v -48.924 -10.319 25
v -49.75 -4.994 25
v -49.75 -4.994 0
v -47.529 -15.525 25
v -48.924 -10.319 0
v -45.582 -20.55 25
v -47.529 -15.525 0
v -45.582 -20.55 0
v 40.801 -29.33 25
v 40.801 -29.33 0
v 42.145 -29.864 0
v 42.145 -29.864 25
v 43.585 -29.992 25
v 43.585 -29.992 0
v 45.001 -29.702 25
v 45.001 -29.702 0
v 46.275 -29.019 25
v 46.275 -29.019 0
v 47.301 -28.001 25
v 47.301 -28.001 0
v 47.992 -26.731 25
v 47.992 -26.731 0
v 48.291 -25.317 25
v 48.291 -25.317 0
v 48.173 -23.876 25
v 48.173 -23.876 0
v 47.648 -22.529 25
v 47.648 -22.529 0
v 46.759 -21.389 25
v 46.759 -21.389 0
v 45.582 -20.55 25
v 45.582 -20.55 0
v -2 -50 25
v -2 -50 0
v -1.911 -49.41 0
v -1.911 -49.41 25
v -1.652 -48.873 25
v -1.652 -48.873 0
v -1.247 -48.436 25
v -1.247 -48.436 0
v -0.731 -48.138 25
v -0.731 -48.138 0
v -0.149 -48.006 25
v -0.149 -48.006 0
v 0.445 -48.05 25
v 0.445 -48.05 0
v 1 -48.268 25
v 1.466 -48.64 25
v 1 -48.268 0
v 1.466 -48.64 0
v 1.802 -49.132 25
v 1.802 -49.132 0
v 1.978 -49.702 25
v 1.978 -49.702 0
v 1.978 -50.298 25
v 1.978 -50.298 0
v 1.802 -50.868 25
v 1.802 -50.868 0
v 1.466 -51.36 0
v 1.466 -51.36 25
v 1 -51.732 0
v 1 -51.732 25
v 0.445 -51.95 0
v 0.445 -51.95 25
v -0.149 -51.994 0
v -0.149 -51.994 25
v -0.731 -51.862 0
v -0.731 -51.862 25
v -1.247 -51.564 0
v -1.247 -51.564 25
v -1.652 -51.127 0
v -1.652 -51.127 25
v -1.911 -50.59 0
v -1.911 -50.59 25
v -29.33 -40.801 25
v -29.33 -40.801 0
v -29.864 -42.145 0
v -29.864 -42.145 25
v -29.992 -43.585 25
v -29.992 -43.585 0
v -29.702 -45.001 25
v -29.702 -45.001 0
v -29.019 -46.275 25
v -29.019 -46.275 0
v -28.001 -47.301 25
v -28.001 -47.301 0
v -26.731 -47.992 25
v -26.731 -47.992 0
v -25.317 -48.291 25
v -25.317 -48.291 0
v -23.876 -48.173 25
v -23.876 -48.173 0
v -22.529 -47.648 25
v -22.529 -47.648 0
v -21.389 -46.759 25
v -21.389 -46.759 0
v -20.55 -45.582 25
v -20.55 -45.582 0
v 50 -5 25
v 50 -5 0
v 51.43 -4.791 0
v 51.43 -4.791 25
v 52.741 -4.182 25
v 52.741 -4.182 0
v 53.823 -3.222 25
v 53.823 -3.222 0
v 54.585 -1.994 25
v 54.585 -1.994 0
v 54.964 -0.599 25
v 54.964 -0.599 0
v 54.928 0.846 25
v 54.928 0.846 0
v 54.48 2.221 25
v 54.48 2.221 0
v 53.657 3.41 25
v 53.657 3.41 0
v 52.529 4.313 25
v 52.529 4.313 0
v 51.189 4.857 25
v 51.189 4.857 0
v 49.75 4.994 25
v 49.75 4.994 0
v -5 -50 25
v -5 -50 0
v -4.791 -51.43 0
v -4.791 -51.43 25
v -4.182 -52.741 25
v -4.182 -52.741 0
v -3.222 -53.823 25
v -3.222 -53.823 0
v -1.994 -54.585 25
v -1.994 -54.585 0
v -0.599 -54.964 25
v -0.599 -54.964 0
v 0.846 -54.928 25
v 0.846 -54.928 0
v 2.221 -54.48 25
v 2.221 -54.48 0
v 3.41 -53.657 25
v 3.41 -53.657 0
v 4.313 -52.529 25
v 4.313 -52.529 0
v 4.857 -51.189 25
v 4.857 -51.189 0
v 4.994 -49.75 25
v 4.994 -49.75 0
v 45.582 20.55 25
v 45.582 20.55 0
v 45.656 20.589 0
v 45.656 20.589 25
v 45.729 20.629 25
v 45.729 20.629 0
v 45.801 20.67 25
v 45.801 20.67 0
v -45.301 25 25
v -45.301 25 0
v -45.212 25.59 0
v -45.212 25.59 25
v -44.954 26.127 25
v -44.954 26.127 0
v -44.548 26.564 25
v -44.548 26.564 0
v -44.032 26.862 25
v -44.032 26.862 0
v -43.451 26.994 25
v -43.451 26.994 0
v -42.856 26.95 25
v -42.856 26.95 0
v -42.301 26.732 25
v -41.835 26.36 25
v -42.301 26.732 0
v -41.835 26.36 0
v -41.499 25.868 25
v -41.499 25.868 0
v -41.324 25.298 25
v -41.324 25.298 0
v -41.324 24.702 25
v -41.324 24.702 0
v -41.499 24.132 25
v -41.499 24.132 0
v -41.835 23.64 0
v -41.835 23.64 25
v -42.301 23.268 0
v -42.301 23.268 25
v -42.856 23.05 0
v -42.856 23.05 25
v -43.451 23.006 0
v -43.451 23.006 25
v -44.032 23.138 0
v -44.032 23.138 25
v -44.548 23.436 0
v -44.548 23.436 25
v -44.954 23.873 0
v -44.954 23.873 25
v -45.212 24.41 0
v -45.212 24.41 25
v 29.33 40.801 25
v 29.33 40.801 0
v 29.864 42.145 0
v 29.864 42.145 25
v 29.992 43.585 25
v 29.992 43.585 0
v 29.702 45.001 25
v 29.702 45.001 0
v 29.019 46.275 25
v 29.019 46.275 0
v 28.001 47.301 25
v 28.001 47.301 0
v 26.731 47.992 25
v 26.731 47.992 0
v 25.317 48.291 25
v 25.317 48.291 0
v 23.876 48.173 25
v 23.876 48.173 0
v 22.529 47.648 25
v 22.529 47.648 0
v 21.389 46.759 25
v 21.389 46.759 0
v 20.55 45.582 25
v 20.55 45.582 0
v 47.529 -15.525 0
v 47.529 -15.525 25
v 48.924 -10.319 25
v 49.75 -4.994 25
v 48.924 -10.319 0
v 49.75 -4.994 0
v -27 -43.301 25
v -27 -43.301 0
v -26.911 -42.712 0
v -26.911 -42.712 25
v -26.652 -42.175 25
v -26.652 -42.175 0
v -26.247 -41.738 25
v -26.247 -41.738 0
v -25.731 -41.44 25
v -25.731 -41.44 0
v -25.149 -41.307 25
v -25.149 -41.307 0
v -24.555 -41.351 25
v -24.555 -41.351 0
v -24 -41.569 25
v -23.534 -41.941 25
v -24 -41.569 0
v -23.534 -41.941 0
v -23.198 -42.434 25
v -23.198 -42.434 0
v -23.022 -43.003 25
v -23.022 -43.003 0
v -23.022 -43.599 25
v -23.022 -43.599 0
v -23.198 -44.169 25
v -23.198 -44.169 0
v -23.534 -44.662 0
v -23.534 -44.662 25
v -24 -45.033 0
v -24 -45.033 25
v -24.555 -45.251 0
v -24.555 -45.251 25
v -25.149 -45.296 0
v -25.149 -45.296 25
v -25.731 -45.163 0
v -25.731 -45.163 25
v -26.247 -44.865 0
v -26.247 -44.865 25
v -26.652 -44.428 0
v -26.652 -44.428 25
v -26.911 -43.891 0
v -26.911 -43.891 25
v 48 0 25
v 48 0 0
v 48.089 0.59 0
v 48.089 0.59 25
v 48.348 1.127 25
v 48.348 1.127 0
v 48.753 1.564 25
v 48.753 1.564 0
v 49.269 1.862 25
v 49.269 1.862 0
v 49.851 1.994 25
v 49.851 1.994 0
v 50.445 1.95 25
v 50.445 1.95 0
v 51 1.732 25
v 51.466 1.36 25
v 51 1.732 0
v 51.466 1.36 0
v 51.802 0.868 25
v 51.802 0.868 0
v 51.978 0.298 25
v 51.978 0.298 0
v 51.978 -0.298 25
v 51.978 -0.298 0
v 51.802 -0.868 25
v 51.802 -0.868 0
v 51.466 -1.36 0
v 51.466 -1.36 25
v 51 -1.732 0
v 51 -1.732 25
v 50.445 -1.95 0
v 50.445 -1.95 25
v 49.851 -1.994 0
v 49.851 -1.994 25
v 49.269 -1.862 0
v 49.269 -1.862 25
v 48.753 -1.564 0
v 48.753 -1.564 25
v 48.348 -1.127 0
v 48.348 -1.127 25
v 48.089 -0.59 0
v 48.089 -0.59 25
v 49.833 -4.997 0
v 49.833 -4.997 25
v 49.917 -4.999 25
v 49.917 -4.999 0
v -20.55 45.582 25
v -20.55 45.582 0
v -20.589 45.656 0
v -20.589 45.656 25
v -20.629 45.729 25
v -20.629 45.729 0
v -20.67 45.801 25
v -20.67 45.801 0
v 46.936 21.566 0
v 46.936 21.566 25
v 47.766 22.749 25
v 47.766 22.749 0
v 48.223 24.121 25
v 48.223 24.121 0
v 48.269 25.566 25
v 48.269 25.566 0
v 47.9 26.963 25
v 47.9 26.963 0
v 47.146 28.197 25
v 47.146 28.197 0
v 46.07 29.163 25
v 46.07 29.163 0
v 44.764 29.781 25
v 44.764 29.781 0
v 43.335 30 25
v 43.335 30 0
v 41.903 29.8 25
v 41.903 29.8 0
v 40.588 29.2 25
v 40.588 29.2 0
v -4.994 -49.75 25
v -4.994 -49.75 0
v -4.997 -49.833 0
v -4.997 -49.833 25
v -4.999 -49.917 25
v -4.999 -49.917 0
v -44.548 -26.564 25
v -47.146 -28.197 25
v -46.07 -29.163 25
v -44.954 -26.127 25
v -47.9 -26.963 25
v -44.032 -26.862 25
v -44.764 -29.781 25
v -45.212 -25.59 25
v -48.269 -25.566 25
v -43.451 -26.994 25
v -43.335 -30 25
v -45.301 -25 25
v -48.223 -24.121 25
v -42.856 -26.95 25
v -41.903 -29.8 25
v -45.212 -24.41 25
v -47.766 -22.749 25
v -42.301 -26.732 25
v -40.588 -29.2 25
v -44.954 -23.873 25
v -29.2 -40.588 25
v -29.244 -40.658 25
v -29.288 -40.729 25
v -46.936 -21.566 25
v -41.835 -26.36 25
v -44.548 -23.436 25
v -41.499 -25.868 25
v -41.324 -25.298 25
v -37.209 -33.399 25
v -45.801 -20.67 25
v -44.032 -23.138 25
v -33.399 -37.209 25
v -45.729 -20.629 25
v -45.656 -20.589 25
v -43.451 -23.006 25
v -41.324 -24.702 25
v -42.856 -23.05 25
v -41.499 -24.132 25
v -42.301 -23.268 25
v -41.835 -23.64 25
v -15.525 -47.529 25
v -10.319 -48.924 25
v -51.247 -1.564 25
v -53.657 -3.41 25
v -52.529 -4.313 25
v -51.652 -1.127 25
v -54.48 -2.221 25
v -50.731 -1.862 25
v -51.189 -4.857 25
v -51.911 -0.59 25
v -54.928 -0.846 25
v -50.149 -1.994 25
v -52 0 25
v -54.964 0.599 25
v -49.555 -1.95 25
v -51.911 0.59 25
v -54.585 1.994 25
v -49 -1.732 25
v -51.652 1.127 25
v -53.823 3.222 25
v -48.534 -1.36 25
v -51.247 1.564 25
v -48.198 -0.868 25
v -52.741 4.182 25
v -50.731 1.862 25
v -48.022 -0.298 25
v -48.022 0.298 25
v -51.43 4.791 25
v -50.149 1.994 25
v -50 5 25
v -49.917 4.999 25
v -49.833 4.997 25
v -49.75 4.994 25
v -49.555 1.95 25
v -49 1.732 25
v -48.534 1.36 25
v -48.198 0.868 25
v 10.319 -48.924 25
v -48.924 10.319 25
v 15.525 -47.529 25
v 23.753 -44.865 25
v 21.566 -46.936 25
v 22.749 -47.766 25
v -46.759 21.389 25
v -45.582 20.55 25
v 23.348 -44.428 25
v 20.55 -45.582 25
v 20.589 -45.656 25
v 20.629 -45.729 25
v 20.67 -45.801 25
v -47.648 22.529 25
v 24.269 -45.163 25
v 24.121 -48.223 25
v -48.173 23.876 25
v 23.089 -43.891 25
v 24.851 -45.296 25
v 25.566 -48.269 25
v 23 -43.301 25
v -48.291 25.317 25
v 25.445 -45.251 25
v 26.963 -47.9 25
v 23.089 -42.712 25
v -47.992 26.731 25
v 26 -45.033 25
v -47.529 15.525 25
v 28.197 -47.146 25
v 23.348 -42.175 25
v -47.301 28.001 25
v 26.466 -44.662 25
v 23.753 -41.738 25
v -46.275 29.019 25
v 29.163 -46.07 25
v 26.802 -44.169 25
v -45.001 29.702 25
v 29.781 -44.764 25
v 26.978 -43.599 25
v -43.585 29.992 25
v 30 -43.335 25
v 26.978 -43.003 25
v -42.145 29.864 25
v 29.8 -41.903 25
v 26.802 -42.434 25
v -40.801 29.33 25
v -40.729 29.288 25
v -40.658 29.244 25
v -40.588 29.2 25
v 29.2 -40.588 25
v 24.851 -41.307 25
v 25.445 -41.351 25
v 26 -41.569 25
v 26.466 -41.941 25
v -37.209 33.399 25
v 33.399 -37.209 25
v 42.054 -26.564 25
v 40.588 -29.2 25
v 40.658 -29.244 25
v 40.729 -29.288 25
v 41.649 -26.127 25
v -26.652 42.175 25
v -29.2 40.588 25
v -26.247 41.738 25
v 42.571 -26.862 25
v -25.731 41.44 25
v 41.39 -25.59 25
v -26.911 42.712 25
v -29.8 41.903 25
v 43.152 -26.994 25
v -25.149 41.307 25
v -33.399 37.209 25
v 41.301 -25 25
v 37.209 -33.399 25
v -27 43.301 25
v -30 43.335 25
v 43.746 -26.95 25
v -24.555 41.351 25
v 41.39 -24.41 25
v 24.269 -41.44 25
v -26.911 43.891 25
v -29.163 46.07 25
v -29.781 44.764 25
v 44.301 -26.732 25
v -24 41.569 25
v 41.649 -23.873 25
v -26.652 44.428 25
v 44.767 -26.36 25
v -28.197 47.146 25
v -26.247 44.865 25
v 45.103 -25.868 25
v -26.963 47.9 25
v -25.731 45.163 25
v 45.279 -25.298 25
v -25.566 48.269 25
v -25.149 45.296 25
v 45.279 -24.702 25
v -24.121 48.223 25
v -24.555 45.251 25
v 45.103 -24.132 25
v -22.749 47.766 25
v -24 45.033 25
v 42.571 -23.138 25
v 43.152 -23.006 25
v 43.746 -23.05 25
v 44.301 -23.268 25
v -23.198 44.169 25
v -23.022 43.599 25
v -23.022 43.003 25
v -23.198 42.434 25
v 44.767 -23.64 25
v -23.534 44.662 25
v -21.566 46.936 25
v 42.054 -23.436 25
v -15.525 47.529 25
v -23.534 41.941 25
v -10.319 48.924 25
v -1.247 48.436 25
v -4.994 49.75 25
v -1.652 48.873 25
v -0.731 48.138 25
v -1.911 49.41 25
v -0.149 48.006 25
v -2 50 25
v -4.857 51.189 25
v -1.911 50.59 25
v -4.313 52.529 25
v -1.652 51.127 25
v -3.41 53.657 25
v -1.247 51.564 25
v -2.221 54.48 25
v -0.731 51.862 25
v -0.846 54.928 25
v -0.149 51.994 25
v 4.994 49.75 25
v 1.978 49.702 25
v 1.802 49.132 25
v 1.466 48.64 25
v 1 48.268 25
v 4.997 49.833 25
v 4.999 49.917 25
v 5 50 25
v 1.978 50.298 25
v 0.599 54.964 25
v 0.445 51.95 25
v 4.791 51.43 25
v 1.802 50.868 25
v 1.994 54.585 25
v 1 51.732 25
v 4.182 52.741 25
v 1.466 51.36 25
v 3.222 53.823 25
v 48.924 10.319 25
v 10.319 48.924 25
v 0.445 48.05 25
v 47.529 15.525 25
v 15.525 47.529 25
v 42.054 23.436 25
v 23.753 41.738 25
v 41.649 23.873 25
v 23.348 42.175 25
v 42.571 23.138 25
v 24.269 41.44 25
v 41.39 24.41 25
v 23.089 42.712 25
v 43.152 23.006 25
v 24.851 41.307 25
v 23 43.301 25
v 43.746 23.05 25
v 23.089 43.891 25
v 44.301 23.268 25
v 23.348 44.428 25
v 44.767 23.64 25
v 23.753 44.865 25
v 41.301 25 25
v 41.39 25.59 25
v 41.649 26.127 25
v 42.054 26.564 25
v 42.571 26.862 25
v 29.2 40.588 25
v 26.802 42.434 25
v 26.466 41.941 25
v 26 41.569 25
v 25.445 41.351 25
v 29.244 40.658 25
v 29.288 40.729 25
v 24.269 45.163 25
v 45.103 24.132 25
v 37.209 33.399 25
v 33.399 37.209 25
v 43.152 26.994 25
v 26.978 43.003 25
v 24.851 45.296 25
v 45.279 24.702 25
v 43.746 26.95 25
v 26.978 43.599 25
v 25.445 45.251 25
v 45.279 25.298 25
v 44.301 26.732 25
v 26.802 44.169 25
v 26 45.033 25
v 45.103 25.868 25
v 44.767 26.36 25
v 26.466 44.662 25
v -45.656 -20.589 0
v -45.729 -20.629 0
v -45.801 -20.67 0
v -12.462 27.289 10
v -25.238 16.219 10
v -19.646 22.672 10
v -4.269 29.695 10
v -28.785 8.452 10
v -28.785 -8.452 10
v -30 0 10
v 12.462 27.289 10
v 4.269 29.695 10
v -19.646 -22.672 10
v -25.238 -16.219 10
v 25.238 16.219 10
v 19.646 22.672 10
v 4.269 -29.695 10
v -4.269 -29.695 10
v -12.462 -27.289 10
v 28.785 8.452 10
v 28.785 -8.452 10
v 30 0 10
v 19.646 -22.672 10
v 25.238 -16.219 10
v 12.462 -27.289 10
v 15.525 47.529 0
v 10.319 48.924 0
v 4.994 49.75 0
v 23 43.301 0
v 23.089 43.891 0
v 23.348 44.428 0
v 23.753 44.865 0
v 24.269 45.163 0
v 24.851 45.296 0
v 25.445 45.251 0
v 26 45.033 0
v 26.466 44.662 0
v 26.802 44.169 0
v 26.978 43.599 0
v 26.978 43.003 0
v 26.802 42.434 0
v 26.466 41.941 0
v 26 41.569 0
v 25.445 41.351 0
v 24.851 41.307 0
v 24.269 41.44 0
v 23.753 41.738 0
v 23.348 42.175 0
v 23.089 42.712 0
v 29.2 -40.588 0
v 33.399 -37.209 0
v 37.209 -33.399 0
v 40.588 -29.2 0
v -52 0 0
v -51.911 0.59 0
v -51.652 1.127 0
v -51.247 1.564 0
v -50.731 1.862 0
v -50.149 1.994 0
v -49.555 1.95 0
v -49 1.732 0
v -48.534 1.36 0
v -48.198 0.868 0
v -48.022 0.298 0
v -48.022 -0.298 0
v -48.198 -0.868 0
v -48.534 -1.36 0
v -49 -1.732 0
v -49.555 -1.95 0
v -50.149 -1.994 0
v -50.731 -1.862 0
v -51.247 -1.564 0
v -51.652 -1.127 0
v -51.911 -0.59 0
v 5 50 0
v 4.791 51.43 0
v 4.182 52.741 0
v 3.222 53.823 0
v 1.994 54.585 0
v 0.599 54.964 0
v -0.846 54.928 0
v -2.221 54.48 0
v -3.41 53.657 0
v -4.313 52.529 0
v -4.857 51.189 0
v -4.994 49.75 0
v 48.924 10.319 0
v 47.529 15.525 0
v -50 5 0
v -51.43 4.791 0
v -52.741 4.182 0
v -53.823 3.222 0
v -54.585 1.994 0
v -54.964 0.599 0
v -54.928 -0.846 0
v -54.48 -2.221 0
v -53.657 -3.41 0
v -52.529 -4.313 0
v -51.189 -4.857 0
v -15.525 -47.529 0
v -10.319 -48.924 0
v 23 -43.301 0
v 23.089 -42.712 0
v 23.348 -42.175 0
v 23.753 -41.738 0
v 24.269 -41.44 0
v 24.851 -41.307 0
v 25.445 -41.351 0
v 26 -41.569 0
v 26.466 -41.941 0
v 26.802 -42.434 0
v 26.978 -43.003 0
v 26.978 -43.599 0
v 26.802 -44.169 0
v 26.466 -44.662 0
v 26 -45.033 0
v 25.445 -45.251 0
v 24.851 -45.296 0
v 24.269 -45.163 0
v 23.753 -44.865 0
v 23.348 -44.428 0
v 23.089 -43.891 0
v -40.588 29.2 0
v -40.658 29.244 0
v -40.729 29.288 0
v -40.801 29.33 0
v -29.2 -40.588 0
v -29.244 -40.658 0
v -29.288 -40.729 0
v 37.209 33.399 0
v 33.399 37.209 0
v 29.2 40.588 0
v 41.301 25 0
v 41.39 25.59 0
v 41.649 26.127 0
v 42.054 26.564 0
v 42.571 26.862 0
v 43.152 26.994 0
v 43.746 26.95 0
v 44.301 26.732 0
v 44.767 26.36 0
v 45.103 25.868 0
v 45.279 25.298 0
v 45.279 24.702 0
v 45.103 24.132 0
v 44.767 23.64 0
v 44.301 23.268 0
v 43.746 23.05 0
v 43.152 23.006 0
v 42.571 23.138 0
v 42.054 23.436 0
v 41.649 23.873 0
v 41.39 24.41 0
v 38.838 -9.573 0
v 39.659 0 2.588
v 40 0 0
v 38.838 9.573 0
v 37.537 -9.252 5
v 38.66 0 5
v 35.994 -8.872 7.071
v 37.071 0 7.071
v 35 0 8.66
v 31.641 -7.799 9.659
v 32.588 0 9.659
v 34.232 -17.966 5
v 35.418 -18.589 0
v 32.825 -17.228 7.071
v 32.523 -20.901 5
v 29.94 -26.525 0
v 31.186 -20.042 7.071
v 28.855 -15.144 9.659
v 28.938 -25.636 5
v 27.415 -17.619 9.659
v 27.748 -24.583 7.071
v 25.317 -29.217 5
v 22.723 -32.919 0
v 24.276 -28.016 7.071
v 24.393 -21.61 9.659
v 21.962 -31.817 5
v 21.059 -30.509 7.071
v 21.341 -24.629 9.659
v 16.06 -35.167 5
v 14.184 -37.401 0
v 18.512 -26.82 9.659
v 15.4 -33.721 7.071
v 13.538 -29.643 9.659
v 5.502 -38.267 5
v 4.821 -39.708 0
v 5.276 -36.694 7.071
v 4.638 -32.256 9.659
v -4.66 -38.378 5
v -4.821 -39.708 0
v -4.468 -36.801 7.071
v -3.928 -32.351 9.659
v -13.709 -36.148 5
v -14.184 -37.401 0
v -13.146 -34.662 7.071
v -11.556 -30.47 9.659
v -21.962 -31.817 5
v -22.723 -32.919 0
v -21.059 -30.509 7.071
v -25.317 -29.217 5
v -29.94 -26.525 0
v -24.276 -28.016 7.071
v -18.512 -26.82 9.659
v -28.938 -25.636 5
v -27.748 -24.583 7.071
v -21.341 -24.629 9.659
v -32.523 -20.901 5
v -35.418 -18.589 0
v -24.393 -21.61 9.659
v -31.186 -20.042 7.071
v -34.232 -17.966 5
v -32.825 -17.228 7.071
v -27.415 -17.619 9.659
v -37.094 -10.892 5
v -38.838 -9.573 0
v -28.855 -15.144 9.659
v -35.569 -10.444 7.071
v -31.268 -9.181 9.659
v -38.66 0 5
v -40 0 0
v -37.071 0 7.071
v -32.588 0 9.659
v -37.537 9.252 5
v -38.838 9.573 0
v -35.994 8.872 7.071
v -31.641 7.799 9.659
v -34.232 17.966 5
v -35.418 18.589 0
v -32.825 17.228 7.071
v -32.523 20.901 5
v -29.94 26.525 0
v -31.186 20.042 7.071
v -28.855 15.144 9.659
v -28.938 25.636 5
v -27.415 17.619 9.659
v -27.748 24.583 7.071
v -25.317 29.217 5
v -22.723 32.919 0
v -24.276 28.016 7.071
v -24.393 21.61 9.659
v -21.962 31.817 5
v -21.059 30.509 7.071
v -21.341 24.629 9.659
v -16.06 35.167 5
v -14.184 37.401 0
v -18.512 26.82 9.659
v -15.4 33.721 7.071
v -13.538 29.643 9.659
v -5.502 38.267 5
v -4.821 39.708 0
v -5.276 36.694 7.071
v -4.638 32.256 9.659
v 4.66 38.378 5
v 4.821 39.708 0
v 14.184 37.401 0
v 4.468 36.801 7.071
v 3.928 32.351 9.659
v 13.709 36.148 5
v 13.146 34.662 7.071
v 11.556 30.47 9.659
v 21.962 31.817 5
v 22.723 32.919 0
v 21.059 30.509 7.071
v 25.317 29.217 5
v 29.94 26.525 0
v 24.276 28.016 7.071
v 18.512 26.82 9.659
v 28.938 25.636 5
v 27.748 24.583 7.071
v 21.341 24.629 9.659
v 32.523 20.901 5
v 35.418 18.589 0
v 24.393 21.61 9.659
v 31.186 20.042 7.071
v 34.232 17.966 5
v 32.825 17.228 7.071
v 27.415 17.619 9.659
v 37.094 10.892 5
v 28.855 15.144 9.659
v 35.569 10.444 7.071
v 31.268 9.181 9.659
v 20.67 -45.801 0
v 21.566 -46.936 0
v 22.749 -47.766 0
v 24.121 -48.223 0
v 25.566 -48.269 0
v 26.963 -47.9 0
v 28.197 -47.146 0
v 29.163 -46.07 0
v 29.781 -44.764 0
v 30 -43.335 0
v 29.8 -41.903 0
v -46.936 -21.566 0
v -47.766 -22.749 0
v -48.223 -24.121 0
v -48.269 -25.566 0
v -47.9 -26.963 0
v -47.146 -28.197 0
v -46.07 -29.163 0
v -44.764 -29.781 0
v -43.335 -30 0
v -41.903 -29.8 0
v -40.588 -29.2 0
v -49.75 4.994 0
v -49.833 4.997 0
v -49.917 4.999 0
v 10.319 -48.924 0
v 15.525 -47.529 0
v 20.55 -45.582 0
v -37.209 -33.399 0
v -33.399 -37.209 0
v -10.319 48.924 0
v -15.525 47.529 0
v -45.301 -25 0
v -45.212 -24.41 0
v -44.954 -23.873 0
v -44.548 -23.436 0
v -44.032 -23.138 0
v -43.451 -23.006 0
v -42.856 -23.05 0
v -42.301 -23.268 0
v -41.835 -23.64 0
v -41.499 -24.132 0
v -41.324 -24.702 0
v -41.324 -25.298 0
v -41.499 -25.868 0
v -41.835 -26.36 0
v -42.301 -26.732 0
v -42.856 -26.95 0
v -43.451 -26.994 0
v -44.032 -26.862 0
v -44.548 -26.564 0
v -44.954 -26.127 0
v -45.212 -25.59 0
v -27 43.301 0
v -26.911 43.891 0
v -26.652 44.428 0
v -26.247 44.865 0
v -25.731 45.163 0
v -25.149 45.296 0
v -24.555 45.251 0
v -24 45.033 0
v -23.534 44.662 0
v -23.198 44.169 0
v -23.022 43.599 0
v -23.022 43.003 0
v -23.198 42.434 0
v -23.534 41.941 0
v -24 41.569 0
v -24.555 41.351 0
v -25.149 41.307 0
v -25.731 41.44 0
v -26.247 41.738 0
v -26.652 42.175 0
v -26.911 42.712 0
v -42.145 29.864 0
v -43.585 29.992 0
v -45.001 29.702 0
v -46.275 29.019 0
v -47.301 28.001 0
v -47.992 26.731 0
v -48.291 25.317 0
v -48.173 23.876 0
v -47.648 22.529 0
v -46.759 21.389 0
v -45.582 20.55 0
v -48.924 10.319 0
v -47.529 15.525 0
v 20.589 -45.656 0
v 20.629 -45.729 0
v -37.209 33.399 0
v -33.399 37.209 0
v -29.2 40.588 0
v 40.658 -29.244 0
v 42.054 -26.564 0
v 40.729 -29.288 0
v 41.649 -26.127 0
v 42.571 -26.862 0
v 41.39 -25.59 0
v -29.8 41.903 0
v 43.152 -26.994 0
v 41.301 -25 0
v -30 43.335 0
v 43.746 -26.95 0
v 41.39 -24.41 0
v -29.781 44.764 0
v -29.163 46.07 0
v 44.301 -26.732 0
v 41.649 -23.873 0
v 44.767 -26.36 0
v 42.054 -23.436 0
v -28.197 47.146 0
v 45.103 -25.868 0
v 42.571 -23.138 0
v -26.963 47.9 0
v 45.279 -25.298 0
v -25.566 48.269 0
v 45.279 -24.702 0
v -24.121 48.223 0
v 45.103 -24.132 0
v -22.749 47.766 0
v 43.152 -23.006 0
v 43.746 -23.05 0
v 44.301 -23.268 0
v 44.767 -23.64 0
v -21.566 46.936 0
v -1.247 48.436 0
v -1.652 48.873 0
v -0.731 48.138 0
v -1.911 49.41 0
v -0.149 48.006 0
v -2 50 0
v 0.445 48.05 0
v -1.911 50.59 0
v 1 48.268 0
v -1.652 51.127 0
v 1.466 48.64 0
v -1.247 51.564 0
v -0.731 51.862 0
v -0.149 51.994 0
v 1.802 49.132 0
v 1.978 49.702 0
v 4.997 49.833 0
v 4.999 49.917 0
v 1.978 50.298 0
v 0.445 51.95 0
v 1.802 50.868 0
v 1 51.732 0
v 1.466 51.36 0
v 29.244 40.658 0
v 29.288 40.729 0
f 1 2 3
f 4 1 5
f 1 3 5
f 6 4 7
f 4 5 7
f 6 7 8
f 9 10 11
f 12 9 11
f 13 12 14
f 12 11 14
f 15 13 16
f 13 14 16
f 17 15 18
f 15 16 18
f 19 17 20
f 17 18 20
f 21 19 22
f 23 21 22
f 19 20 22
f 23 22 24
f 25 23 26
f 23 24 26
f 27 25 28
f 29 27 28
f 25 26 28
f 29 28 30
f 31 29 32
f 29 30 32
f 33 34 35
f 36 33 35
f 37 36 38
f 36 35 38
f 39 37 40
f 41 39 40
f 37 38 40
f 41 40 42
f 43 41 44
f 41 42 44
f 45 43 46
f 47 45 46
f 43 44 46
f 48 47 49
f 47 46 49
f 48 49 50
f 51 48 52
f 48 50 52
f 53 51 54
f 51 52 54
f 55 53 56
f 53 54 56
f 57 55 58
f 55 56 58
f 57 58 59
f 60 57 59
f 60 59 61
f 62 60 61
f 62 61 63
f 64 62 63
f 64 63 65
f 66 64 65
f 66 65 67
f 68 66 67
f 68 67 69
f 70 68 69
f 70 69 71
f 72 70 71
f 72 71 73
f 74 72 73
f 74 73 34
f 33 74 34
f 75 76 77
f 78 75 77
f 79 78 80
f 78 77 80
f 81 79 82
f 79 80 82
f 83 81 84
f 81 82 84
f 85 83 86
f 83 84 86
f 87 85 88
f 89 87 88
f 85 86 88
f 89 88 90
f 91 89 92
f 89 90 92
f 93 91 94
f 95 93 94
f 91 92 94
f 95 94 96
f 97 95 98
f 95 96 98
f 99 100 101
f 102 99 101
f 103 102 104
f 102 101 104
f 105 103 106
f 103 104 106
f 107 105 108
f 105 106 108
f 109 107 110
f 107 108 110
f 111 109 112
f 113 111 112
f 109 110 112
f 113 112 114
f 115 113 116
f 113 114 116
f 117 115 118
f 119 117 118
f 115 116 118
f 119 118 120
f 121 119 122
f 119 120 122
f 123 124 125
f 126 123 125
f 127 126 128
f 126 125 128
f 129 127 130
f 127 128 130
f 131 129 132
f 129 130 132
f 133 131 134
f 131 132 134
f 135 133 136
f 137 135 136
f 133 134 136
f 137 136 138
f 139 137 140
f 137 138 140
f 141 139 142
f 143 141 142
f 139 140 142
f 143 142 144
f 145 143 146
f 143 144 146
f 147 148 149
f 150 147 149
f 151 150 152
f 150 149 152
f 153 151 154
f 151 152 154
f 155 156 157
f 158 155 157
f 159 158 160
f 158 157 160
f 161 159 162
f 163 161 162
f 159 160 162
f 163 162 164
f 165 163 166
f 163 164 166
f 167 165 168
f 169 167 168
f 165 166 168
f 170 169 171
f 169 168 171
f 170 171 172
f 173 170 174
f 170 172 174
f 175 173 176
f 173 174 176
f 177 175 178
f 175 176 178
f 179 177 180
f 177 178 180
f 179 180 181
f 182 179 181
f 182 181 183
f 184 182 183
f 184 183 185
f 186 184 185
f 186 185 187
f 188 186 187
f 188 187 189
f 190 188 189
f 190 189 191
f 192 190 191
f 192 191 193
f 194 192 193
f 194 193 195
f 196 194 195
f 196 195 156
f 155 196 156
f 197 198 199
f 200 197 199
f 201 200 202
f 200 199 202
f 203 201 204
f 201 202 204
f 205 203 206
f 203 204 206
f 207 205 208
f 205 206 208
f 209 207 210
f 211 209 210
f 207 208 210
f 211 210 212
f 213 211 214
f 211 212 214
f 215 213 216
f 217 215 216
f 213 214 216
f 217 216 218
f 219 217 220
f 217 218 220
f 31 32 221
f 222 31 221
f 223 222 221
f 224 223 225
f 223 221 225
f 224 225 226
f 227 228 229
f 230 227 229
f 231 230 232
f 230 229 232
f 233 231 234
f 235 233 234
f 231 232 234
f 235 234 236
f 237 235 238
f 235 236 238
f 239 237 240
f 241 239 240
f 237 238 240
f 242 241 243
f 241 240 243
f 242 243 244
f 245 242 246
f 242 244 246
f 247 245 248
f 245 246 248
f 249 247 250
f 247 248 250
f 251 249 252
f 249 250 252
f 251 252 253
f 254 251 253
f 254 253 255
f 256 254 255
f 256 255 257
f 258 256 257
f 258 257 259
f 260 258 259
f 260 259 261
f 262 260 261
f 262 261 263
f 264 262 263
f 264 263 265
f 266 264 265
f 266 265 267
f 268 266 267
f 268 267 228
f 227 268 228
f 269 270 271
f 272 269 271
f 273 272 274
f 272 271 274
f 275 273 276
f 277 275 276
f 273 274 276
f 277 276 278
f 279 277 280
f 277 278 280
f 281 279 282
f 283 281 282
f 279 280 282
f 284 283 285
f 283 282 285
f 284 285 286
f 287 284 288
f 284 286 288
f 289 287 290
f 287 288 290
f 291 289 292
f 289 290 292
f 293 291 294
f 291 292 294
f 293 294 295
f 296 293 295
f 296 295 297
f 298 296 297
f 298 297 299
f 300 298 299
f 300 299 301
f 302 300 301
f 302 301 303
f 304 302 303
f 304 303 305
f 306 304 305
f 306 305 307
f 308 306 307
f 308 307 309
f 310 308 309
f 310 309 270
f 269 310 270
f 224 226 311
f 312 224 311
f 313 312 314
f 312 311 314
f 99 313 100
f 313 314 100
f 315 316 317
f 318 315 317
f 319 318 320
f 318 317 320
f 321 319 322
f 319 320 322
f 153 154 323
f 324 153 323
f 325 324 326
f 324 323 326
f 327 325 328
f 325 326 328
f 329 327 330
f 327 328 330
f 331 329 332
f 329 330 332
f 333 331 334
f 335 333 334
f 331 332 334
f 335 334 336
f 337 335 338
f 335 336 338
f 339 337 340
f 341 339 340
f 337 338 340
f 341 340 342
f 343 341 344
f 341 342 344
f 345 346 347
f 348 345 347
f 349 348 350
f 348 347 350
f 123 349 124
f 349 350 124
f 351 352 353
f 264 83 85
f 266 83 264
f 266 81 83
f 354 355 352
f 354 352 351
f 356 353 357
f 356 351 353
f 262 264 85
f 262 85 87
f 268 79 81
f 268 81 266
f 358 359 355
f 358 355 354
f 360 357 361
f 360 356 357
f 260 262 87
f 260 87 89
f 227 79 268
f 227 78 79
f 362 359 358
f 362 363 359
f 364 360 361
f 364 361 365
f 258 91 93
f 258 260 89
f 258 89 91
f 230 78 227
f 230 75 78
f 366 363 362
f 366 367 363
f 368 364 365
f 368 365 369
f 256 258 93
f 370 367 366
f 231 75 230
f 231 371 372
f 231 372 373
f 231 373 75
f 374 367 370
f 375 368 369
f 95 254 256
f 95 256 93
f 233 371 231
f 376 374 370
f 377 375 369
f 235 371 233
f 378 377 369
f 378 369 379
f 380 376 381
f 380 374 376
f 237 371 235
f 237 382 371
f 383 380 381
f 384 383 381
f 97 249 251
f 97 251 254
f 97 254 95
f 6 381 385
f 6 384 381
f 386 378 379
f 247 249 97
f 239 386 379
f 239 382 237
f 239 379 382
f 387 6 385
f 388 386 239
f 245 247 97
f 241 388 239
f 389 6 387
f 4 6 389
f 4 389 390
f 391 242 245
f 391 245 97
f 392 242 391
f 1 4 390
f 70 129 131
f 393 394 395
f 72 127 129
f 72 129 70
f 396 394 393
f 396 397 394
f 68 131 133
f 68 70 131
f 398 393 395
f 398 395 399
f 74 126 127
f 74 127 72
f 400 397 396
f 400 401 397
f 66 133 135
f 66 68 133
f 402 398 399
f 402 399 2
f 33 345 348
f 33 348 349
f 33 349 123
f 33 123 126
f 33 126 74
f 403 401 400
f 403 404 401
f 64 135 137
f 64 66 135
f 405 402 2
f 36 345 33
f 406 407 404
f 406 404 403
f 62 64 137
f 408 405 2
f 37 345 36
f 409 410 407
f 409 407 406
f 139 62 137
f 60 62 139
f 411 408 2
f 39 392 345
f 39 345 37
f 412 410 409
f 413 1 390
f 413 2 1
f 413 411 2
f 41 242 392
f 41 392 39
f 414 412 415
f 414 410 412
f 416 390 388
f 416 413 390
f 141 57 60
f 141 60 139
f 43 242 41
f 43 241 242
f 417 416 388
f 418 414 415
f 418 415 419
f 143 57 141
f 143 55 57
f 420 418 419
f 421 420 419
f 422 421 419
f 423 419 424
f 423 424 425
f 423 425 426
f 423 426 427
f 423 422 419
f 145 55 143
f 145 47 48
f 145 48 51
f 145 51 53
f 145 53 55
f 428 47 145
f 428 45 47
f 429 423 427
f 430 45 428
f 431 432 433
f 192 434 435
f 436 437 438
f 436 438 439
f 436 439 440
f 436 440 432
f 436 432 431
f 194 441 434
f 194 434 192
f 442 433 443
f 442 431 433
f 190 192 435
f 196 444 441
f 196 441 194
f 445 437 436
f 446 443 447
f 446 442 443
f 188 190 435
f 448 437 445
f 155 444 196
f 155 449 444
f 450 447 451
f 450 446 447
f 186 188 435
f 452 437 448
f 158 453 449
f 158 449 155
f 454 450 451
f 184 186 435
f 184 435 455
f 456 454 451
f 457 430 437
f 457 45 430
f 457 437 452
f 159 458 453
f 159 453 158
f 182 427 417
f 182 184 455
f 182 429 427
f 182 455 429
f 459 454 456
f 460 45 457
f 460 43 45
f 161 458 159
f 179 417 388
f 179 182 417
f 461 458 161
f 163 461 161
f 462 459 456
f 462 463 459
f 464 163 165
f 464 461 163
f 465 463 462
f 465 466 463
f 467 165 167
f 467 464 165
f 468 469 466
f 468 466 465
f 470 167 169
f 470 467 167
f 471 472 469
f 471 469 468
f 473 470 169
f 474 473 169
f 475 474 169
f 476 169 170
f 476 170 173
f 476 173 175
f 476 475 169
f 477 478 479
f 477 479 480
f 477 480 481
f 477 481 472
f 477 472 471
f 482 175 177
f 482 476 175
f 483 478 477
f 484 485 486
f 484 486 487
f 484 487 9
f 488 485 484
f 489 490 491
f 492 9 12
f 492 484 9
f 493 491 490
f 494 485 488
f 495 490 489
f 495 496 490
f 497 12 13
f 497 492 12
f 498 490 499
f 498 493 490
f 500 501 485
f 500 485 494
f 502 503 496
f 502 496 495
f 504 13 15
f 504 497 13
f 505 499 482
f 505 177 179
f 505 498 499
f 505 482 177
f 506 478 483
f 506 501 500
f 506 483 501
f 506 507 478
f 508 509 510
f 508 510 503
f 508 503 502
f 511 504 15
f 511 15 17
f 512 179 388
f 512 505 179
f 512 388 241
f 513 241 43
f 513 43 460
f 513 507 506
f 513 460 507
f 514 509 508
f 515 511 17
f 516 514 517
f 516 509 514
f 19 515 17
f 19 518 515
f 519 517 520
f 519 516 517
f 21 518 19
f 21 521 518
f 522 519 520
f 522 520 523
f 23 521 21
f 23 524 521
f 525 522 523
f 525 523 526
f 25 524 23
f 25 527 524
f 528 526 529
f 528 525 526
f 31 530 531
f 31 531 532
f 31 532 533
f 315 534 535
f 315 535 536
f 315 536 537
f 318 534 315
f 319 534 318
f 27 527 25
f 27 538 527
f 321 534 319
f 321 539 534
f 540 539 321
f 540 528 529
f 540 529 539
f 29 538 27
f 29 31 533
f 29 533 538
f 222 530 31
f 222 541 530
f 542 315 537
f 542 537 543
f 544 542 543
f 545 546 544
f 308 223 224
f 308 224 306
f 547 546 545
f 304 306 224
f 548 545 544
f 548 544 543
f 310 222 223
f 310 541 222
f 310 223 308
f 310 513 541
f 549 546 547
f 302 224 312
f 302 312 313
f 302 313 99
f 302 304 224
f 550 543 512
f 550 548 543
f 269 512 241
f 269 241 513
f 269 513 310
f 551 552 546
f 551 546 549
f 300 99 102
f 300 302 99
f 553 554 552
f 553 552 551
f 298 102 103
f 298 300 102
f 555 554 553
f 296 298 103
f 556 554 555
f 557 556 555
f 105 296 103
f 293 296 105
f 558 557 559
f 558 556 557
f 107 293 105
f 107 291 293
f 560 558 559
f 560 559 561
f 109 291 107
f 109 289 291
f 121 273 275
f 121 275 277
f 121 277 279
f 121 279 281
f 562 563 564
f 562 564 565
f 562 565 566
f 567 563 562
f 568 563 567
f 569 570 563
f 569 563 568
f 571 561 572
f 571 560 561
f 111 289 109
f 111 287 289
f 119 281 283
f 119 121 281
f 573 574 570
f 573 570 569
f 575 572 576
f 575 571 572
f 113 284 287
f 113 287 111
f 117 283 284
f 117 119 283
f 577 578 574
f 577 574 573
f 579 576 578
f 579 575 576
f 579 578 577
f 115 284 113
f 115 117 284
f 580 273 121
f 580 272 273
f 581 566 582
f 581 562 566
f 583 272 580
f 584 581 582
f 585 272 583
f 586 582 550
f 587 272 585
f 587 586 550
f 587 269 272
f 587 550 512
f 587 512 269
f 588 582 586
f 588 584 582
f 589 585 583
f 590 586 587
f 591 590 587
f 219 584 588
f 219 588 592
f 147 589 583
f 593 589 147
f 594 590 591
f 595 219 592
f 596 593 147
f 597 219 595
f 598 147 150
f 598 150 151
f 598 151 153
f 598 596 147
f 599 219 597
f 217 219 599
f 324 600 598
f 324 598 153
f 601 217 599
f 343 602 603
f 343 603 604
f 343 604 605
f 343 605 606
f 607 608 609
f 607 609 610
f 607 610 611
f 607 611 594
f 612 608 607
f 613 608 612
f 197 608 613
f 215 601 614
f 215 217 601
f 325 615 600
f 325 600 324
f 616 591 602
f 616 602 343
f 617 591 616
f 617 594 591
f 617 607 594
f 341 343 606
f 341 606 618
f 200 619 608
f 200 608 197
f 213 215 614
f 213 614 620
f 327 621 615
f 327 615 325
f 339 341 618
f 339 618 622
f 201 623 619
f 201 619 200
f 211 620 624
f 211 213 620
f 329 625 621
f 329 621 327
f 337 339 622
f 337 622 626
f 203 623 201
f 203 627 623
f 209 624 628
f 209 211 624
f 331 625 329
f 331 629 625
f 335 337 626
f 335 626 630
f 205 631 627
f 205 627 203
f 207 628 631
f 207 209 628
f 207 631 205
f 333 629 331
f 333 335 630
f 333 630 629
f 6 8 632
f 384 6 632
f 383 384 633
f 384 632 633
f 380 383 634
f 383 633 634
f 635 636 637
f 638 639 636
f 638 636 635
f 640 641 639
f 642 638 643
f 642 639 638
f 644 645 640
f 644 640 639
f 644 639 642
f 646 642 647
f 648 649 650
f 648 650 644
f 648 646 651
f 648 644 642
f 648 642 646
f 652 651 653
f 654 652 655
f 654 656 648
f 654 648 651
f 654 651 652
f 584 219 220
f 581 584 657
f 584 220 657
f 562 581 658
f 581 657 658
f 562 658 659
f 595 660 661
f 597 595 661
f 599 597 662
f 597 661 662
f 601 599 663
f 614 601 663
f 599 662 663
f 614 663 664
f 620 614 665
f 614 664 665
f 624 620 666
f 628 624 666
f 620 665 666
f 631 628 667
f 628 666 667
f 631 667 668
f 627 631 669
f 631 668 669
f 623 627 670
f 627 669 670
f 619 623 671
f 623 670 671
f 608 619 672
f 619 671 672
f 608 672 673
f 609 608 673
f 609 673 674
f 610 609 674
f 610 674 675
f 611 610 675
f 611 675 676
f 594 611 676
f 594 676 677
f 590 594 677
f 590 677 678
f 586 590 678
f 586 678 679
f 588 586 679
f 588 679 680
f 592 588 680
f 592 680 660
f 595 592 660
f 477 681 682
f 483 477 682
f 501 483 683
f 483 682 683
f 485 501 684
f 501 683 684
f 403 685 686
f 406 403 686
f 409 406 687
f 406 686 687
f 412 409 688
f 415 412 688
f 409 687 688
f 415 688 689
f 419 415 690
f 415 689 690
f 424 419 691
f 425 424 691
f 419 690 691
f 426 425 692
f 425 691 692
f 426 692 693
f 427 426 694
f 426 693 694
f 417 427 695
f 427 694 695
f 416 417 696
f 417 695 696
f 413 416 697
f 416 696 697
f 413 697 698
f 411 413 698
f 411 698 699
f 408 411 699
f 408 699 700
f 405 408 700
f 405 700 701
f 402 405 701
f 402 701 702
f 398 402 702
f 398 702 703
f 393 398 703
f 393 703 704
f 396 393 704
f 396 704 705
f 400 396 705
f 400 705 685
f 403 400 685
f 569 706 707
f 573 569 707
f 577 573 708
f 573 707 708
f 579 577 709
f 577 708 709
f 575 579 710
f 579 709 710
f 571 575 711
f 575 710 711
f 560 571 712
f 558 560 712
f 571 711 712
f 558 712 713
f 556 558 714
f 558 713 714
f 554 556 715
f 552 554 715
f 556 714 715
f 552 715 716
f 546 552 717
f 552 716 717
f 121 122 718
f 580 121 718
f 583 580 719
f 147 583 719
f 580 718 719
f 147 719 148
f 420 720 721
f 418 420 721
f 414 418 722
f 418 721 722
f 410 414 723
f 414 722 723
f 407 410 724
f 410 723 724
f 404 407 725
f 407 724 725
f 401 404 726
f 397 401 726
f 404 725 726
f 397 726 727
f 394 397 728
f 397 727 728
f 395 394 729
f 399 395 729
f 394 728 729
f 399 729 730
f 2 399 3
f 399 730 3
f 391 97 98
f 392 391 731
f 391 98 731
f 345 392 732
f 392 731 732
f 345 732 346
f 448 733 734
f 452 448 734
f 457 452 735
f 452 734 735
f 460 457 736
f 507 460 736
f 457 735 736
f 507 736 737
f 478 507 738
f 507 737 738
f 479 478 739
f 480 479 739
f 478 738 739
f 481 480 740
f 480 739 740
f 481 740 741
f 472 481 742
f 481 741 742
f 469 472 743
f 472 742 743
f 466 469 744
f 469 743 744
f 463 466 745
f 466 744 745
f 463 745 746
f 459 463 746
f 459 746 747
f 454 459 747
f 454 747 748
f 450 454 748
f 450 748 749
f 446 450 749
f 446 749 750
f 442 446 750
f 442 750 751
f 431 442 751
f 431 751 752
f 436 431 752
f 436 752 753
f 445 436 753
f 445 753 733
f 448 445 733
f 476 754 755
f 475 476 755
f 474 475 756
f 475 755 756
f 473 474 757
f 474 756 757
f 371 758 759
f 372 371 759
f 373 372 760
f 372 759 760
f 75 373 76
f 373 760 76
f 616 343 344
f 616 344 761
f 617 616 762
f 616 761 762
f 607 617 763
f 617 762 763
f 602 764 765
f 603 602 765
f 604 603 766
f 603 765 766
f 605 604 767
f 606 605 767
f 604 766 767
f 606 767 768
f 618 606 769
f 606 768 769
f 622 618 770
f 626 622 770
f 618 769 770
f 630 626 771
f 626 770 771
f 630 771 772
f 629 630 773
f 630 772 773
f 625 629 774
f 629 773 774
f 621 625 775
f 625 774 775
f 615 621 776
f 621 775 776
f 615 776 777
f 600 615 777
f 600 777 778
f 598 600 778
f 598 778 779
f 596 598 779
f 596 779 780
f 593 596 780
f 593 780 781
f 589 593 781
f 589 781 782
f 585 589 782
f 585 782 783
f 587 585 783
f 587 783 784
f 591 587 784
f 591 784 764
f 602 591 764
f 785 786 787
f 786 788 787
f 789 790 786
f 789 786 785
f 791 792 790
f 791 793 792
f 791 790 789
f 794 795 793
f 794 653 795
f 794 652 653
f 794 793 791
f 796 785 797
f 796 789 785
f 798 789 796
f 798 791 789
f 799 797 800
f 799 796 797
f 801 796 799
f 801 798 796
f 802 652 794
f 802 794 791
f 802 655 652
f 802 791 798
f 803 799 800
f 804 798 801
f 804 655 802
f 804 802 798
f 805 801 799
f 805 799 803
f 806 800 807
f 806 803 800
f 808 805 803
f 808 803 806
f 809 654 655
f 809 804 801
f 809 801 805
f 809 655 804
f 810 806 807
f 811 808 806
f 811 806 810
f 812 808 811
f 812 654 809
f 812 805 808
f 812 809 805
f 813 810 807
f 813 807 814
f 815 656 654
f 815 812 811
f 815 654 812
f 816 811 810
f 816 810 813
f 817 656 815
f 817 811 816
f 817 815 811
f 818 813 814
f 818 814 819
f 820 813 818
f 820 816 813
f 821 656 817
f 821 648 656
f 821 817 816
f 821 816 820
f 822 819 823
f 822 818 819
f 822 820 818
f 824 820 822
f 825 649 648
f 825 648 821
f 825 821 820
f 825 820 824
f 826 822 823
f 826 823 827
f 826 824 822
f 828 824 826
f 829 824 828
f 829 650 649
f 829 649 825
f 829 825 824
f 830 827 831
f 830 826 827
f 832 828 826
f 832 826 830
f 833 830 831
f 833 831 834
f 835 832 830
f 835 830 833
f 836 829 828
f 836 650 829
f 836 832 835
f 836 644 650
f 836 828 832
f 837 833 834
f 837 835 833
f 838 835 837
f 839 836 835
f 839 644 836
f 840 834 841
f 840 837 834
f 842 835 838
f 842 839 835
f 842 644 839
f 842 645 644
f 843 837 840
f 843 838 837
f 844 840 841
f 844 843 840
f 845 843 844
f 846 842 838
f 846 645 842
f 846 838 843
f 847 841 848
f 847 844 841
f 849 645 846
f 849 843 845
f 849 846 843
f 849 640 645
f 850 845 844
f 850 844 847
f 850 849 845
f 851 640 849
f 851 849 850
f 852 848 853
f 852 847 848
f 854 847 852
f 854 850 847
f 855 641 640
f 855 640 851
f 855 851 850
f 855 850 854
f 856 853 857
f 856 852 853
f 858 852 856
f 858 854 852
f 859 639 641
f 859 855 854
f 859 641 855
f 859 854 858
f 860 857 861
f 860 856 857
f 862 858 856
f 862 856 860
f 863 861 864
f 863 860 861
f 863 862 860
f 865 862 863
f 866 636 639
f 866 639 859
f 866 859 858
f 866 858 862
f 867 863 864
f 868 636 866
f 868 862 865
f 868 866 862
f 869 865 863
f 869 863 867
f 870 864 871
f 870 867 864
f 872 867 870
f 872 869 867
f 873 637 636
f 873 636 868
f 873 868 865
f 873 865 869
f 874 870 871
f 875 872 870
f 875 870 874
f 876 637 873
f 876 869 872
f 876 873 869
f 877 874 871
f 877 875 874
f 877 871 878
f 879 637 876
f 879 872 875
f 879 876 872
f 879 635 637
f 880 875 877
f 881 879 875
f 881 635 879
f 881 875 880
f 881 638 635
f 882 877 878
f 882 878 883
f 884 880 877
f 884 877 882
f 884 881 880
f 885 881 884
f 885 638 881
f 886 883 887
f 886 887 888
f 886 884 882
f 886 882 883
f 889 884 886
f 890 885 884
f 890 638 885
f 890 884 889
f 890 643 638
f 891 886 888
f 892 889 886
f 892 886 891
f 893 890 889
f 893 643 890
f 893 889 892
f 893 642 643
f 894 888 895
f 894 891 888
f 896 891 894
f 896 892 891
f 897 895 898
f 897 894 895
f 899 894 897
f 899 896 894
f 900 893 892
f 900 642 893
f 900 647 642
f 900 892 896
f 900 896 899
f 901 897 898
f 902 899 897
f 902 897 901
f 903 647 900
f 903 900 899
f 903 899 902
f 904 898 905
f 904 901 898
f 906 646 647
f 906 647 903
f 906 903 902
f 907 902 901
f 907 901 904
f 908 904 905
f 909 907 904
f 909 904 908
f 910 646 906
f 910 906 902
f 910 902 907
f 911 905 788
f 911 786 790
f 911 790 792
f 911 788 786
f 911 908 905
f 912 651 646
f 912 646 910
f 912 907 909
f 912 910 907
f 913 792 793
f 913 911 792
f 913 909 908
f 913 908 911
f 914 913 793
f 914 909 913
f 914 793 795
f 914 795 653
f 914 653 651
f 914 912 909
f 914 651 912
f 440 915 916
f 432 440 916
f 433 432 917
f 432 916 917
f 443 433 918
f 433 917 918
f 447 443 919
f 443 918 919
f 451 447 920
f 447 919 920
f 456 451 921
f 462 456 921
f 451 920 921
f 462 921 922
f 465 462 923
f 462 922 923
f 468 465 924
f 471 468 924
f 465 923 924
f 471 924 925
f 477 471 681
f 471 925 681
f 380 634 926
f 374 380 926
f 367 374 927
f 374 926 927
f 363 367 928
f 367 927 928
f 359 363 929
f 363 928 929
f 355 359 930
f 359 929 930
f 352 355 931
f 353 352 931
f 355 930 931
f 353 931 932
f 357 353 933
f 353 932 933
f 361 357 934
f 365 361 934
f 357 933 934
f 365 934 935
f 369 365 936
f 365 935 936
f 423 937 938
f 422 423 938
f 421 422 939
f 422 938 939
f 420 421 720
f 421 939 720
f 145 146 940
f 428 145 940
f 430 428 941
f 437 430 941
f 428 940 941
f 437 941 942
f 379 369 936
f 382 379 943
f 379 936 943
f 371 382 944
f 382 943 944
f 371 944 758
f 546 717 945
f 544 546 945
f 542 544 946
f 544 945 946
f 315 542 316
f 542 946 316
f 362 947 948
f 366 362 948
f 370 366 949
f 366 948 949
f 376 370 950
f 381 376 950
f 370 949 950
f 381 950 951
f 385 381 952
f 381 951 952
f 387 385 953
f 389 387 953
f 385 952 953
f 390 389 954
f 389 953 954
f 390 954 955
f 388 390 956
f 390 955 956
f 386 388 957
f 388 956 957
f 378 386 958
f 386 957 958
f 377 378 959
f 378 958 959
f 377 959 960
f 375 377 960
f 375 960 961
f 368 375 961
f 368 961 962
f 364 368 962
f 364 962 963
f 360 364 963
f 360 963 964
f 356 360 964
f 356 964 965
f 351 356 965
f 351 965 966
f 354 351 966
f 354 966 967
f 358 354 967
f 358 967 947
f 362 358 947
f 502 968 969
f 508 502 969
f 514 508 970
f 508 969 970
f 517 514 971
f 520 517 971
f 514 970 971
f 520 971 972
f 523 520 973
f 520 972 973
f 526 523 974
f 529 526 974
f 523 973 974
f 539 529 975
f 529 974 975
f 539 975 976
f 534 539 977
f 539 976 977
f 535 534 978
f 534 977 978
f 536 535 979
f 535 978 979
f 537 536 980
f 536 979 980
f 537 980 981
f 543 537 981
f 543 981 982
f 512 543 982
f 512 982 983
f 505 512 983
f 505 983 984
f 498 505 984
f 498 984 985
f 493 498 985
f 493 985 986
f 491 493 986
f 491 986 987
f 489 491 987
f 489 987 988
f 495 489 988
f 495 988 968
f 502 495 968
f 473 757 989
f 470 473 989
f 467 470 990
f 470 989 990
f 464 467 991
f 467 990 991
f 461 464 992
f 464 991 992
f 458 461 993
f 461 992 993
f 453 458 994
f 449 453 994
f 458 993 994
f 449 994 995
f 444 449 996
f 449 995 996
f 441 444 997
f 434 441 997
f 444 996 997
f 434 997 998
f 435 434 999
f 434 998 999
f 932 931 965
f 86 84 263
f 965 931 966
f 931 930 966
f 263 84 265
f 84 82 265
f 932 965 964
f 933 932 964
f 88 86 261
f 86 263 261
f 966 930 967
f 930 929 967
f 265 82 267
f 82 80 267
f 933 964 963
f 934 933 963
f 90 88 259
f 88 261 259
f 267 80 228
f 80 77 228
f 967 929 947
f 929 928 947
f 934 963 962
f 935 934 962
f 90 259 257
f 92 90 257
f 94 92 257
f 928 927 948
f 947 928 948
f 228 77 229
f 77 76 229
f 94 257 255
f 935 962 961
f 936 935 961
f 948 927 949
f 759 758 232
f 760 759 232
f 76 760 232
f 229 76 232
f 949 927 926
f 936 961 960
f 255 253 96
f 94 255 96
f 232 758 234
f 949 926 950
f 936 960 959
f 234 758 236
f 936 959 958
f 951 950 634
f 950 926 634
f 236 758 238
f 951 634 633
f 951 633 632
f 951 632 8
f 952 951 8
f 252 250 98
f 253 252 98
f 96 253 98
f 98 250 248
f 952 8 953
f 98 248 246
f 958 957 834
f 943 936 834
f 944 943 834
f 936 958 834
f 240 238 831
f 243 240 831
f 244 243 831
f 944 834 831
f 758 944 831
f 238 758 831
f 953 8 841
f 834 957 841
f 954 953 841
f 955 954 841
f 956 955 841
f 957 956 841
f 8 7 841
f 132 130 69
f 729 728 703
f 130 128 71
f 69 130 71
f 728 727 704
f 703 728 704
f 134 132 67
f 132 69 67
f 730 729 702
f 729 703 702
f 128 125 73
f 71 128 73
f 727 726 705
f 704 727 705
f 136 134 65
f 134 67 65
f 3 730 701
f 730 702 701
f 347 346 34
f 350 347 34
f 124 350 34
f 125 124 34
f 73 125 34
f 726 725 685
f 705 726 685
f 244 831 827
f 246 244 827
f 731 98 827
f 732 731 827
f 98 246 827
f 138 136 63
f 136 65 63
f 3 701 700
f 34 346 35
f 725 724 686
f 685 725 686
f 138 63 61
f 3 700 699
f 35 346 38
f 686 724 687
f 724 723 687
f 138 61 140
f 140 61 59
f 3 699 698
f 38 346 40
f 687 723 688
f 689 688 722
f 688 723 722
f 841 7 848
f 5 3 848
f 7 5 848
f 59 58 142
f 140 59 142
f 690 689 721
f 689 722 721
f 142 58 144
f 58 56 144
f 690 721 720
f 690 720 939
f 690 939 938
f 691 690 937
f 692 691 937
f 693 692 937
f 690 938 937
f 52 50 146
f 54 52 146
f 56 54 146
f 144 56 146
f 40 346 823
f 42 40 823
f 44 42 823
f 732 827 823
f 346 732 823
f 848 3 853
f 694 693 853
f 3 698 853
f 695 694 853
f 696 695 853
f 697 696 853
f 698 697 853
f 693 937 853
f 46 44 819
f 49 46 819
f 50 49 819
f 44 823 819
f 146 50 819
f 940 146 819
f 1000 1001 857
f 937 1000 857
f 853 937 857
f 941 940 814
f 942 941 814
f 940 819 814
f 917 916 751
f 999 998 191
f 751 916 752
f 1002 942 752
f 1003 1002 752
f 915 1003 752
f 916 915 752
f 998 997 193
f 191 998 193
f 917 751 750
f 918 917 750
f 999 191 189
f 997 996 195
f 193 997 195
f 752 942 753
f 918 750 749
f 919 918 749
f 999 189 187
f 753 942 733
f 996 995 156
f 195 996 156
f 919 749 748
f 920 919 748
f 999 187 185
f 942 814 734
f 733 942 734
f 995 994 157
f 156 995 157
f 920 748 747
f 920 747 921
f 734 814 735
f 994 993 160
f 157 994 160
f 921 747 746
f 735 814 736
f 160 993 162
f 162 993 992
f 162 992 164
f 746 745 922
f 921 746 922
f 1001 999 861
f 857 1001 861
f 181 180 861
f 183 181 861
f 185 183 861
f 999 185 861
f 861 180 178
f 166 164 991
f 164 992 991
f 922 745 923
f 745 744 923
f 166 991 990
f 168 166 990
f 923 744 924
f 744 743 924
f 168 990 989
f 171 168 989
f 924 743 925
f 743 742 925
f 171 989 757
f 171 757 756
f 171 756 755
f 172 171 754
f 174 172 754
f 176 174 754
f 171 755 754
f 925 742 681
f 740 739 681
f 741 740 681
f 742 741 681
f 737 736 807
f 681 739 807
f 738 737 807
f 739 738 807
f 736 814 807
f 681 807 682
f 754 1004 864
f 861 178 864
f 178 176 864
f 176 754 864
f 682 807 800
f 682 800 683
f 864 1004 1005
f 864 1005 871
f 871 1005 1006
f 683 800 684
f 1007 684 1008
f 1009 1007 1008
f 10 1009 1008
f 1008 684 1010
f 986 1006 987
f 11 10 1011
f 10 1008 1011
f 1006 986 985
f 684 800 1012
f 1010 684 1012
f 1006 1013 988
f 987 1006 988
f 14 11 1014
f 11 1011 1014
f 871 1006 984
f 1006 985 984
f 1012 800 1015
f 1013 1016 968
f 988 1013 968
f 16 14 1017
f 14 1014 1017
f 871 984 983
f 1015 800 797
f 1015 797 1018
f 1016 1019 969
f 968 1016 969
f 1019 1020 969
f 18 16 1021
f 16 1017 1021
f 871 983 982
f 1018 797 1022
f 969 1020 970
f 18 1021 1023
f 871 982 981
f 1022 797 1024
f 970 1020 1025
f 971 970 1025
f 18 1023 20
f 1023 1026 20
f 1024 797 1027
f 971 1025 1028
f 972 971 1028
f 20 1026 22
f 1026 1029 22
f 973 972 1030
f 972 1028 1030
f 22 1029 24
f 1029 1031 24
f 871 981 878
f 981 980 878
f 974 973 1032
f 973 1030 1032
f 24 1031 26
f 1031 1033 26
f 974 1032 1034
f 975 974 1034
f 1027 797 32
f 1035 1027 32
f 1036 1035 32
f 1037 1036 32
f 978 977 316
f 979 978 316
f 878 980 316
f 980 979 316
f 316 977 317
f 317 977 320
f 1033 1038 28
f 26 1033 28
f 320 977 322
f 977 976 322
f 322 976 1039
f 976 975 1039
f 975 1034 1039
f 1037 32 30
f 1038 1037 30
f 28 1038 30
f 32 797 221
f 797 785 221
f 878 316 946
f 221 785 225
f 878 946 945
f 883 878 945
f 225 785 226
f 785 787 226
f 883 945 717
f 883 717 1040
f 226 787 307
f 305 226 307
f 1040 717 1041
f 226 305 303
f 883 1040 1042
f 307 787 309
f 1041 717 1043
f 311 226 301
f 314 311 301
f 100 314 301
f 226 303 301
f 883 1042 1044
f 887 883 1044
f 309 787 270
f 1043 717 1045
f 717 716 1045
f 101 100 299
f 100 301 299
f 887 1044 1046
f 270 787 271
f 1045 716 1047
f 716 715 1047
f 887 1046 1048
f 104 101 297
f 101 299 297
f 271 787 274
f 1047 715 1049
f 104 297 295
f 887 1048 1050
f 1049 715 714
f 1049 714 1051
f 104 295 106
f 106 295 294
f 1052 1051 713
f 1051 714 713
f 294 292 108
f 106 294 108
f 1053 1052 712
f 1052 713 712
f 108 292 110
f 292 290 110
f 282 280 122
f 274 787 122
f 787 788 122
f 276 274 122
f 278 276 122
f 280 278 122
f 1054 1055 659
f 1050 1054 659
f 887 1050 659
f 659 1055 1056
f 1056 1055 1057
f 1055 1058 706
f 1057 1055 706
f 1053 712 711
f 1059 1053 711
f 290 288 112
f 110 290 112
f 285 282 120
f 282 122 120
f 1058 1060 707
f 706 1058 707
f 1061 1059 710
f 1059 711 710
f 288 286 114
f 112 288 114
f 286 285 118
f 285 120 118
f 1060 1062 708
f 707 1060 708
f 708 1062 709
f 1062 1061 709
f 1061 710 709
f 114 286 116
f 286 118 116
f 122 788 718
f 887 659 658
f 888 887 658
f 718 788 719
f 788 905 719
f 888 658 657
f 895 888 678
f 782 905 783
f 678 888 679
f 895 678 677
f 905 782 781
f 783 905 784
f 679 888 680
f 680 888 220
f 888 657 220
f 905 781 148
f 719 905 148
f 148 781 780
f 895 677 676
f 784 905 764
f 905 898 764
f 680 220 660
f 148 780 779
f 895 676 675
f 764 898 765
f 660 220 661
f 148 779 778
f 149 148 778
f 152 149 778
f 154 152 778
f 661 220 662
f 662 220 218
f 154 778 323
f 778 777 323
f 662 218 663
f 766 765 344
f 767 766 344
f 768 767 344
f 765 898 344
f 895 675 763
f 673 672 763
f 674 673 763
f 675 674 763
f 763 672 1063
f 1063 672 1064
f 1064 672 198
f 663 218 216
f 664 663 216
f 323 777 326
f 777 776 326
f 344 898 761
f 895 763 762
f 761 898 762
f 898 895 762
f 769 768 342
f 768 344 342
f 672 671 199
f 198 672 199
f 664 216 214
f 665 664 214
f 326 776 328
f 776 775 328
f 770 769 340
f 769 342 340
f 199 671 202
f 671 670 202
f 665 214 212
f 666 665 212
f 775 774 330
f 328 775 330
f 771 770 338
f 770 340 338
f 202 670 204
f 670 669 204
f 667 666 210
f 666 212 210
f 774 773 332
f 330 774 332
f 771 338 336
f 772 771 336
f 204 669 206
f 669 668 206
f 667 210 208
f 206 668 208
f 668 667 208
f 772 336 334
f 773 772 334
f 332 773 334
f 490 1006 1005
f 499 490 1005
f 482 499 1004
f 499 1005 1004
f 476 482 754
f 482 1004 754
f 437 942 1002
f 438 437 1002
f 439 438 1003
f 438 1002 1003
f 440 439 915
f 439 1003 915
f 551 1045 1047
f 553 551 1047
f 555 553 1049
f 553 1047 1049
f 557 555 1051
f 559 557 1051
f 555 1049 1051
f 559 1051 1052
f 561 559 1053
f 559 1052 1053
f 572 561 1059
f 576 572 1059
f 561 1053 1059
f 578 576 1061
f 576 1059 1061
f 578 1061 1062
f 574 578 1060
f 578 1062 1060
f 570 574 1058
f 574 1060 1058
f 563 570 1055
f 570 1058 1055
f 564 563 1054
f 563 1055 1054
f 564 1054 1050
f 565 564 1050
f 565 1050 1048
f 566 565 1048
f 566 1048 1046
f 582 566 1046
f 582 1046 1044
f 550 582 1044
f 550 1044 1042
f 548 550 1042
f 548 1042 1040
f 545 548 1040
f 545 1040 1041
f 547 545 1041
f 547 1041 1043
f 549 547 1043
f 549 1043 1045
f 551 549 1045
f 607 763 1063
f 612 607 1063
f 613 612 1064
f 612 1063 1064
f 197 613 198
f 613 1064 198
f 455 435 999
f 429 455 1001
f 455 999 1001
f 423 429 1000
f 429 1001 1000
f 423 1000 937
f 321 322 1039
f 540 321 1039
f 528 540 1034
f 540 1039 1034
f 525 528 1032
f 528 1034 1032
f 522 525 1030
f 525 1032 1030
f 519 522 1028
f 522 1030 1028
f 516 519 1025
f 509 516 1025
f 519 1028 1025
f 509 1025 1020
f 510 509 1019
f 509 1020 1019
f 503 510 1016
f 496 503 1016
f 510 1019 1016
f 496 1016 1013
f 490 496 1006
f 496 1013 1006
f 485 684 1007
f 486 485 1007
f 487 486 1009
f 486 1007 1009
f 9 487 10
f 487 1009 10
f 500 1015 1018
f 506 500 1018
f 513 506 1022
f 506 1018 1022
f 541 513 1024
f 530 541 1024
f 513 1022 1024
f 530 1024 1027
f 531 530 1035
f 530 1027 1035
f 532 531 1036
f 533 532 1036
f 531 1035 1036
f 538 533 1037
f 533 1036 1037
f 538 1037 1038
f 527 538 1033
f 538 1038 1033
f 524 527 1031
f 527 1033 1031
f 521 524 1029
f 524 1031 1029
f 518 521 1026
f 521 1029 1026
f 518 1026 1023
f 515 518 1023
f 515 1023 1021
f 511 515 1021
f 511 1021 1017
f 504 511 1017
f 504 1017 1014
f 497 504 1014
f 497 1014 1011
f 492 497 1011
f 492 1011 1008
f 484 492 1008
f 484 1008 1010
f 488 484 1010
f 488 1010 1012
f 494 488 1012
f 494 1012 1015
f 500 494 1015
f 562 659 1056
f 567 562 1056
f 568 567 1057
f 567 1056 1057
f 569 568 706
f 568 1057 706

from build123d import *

# Parameters (mm, degrees)
F1_DEPTH = 25
F2_COUNT = 12
F3_R     = 40
F4_DEPTH = 10
F5_R     = 9.99999
F7_D     = 4


# Not quite as in the source:
# - a fillet or chamfer is up to 0.001 mm smaller than in the source, because OpenCascade refuses the exact size


with BuildPart() as f1:
    # F0 (on Top) → F1 (new body)
    with BuildSketch(Plane.XY):
        with BuildLine():
            ThreePointArc((-4.9937460889, 49.75), (-33.5433502766, -37.0788841825), (50, 0))
            ThreePointArc((50, 0), (37.0788841825, 33.5433502766), (4.9937460889, 49.75))
            ThreePointArc((4.9937460889, 49.75), (0, 45), (-4.9937460889, 49.75))
        make_face()
        with BuildLine():
            ThreePointArc((-4.9937460889, 49.75), (0, 45), (4.9937460889, 49.75))
            ThreePointArc((4.9937460889, 49.75), (0, 50), (-4.9937460889, 49.75))
        make_face()
        with BuildLine():
            ThreePointArc((-4.9937460889, 49.75), (0, 50), (4.9937460889, 49.75))
            ThreePointArc((4.9937460889, 49.75), (4.9984362777, 49.8749608947), (5, 50))
            ThreePointArc((5, 50), (-0.1250391053, 54.9984362777), (-4.9937460889, 49.75))
        make_face()
    extrude(amount=F1_DEPTH)

    # F2: F1 ×12 about axis
    f2_axis = Axis((0, 0, 0), (0, 0, -1))


with BuildPart() as f1_1:
    add(f1.part)
    for i in range(1, F2_COUNT):
        add(f1.part.rotate(f2_axis, i * 360 / F2_COUNT))

    # F3 (on face) → F4 (cut)
    with BuildSketch(Plane(origin=(0, 0, 0), x_dir=(1, 0, 0), z_dir=(0, 0, -1))):
        Circle(F3_R)
    extrude(amount=-F4_DEPTH, mode=Mode.SUBTRACT)

    # F5 (radius 10 in the source; OpenCascade refuses exactly that, so slightly less here)
    f5_edges = [f1_1.edges().sort_by_distance(p)[0] for p in [
        (-40, 0, 10),
    ]]
    fillet(f5_edges, radius=F5_R)

    # F7 (through all)
    with Locations(Plane.XY.offset(25)):
        with Locations((25, 43.3012701892), (43.3012701892, 25), (50, 0), (43.3012701892, -25), (25, -43.3012701892), (0, -50), (-25, -43.3012701892), (-43.3012701892, -25), (-50, 0), (-43.3012701892, 25), (-25, 43.3012701892), (0, 50)):
            Hole(F7_D / 2)


solid = f1_1.part
